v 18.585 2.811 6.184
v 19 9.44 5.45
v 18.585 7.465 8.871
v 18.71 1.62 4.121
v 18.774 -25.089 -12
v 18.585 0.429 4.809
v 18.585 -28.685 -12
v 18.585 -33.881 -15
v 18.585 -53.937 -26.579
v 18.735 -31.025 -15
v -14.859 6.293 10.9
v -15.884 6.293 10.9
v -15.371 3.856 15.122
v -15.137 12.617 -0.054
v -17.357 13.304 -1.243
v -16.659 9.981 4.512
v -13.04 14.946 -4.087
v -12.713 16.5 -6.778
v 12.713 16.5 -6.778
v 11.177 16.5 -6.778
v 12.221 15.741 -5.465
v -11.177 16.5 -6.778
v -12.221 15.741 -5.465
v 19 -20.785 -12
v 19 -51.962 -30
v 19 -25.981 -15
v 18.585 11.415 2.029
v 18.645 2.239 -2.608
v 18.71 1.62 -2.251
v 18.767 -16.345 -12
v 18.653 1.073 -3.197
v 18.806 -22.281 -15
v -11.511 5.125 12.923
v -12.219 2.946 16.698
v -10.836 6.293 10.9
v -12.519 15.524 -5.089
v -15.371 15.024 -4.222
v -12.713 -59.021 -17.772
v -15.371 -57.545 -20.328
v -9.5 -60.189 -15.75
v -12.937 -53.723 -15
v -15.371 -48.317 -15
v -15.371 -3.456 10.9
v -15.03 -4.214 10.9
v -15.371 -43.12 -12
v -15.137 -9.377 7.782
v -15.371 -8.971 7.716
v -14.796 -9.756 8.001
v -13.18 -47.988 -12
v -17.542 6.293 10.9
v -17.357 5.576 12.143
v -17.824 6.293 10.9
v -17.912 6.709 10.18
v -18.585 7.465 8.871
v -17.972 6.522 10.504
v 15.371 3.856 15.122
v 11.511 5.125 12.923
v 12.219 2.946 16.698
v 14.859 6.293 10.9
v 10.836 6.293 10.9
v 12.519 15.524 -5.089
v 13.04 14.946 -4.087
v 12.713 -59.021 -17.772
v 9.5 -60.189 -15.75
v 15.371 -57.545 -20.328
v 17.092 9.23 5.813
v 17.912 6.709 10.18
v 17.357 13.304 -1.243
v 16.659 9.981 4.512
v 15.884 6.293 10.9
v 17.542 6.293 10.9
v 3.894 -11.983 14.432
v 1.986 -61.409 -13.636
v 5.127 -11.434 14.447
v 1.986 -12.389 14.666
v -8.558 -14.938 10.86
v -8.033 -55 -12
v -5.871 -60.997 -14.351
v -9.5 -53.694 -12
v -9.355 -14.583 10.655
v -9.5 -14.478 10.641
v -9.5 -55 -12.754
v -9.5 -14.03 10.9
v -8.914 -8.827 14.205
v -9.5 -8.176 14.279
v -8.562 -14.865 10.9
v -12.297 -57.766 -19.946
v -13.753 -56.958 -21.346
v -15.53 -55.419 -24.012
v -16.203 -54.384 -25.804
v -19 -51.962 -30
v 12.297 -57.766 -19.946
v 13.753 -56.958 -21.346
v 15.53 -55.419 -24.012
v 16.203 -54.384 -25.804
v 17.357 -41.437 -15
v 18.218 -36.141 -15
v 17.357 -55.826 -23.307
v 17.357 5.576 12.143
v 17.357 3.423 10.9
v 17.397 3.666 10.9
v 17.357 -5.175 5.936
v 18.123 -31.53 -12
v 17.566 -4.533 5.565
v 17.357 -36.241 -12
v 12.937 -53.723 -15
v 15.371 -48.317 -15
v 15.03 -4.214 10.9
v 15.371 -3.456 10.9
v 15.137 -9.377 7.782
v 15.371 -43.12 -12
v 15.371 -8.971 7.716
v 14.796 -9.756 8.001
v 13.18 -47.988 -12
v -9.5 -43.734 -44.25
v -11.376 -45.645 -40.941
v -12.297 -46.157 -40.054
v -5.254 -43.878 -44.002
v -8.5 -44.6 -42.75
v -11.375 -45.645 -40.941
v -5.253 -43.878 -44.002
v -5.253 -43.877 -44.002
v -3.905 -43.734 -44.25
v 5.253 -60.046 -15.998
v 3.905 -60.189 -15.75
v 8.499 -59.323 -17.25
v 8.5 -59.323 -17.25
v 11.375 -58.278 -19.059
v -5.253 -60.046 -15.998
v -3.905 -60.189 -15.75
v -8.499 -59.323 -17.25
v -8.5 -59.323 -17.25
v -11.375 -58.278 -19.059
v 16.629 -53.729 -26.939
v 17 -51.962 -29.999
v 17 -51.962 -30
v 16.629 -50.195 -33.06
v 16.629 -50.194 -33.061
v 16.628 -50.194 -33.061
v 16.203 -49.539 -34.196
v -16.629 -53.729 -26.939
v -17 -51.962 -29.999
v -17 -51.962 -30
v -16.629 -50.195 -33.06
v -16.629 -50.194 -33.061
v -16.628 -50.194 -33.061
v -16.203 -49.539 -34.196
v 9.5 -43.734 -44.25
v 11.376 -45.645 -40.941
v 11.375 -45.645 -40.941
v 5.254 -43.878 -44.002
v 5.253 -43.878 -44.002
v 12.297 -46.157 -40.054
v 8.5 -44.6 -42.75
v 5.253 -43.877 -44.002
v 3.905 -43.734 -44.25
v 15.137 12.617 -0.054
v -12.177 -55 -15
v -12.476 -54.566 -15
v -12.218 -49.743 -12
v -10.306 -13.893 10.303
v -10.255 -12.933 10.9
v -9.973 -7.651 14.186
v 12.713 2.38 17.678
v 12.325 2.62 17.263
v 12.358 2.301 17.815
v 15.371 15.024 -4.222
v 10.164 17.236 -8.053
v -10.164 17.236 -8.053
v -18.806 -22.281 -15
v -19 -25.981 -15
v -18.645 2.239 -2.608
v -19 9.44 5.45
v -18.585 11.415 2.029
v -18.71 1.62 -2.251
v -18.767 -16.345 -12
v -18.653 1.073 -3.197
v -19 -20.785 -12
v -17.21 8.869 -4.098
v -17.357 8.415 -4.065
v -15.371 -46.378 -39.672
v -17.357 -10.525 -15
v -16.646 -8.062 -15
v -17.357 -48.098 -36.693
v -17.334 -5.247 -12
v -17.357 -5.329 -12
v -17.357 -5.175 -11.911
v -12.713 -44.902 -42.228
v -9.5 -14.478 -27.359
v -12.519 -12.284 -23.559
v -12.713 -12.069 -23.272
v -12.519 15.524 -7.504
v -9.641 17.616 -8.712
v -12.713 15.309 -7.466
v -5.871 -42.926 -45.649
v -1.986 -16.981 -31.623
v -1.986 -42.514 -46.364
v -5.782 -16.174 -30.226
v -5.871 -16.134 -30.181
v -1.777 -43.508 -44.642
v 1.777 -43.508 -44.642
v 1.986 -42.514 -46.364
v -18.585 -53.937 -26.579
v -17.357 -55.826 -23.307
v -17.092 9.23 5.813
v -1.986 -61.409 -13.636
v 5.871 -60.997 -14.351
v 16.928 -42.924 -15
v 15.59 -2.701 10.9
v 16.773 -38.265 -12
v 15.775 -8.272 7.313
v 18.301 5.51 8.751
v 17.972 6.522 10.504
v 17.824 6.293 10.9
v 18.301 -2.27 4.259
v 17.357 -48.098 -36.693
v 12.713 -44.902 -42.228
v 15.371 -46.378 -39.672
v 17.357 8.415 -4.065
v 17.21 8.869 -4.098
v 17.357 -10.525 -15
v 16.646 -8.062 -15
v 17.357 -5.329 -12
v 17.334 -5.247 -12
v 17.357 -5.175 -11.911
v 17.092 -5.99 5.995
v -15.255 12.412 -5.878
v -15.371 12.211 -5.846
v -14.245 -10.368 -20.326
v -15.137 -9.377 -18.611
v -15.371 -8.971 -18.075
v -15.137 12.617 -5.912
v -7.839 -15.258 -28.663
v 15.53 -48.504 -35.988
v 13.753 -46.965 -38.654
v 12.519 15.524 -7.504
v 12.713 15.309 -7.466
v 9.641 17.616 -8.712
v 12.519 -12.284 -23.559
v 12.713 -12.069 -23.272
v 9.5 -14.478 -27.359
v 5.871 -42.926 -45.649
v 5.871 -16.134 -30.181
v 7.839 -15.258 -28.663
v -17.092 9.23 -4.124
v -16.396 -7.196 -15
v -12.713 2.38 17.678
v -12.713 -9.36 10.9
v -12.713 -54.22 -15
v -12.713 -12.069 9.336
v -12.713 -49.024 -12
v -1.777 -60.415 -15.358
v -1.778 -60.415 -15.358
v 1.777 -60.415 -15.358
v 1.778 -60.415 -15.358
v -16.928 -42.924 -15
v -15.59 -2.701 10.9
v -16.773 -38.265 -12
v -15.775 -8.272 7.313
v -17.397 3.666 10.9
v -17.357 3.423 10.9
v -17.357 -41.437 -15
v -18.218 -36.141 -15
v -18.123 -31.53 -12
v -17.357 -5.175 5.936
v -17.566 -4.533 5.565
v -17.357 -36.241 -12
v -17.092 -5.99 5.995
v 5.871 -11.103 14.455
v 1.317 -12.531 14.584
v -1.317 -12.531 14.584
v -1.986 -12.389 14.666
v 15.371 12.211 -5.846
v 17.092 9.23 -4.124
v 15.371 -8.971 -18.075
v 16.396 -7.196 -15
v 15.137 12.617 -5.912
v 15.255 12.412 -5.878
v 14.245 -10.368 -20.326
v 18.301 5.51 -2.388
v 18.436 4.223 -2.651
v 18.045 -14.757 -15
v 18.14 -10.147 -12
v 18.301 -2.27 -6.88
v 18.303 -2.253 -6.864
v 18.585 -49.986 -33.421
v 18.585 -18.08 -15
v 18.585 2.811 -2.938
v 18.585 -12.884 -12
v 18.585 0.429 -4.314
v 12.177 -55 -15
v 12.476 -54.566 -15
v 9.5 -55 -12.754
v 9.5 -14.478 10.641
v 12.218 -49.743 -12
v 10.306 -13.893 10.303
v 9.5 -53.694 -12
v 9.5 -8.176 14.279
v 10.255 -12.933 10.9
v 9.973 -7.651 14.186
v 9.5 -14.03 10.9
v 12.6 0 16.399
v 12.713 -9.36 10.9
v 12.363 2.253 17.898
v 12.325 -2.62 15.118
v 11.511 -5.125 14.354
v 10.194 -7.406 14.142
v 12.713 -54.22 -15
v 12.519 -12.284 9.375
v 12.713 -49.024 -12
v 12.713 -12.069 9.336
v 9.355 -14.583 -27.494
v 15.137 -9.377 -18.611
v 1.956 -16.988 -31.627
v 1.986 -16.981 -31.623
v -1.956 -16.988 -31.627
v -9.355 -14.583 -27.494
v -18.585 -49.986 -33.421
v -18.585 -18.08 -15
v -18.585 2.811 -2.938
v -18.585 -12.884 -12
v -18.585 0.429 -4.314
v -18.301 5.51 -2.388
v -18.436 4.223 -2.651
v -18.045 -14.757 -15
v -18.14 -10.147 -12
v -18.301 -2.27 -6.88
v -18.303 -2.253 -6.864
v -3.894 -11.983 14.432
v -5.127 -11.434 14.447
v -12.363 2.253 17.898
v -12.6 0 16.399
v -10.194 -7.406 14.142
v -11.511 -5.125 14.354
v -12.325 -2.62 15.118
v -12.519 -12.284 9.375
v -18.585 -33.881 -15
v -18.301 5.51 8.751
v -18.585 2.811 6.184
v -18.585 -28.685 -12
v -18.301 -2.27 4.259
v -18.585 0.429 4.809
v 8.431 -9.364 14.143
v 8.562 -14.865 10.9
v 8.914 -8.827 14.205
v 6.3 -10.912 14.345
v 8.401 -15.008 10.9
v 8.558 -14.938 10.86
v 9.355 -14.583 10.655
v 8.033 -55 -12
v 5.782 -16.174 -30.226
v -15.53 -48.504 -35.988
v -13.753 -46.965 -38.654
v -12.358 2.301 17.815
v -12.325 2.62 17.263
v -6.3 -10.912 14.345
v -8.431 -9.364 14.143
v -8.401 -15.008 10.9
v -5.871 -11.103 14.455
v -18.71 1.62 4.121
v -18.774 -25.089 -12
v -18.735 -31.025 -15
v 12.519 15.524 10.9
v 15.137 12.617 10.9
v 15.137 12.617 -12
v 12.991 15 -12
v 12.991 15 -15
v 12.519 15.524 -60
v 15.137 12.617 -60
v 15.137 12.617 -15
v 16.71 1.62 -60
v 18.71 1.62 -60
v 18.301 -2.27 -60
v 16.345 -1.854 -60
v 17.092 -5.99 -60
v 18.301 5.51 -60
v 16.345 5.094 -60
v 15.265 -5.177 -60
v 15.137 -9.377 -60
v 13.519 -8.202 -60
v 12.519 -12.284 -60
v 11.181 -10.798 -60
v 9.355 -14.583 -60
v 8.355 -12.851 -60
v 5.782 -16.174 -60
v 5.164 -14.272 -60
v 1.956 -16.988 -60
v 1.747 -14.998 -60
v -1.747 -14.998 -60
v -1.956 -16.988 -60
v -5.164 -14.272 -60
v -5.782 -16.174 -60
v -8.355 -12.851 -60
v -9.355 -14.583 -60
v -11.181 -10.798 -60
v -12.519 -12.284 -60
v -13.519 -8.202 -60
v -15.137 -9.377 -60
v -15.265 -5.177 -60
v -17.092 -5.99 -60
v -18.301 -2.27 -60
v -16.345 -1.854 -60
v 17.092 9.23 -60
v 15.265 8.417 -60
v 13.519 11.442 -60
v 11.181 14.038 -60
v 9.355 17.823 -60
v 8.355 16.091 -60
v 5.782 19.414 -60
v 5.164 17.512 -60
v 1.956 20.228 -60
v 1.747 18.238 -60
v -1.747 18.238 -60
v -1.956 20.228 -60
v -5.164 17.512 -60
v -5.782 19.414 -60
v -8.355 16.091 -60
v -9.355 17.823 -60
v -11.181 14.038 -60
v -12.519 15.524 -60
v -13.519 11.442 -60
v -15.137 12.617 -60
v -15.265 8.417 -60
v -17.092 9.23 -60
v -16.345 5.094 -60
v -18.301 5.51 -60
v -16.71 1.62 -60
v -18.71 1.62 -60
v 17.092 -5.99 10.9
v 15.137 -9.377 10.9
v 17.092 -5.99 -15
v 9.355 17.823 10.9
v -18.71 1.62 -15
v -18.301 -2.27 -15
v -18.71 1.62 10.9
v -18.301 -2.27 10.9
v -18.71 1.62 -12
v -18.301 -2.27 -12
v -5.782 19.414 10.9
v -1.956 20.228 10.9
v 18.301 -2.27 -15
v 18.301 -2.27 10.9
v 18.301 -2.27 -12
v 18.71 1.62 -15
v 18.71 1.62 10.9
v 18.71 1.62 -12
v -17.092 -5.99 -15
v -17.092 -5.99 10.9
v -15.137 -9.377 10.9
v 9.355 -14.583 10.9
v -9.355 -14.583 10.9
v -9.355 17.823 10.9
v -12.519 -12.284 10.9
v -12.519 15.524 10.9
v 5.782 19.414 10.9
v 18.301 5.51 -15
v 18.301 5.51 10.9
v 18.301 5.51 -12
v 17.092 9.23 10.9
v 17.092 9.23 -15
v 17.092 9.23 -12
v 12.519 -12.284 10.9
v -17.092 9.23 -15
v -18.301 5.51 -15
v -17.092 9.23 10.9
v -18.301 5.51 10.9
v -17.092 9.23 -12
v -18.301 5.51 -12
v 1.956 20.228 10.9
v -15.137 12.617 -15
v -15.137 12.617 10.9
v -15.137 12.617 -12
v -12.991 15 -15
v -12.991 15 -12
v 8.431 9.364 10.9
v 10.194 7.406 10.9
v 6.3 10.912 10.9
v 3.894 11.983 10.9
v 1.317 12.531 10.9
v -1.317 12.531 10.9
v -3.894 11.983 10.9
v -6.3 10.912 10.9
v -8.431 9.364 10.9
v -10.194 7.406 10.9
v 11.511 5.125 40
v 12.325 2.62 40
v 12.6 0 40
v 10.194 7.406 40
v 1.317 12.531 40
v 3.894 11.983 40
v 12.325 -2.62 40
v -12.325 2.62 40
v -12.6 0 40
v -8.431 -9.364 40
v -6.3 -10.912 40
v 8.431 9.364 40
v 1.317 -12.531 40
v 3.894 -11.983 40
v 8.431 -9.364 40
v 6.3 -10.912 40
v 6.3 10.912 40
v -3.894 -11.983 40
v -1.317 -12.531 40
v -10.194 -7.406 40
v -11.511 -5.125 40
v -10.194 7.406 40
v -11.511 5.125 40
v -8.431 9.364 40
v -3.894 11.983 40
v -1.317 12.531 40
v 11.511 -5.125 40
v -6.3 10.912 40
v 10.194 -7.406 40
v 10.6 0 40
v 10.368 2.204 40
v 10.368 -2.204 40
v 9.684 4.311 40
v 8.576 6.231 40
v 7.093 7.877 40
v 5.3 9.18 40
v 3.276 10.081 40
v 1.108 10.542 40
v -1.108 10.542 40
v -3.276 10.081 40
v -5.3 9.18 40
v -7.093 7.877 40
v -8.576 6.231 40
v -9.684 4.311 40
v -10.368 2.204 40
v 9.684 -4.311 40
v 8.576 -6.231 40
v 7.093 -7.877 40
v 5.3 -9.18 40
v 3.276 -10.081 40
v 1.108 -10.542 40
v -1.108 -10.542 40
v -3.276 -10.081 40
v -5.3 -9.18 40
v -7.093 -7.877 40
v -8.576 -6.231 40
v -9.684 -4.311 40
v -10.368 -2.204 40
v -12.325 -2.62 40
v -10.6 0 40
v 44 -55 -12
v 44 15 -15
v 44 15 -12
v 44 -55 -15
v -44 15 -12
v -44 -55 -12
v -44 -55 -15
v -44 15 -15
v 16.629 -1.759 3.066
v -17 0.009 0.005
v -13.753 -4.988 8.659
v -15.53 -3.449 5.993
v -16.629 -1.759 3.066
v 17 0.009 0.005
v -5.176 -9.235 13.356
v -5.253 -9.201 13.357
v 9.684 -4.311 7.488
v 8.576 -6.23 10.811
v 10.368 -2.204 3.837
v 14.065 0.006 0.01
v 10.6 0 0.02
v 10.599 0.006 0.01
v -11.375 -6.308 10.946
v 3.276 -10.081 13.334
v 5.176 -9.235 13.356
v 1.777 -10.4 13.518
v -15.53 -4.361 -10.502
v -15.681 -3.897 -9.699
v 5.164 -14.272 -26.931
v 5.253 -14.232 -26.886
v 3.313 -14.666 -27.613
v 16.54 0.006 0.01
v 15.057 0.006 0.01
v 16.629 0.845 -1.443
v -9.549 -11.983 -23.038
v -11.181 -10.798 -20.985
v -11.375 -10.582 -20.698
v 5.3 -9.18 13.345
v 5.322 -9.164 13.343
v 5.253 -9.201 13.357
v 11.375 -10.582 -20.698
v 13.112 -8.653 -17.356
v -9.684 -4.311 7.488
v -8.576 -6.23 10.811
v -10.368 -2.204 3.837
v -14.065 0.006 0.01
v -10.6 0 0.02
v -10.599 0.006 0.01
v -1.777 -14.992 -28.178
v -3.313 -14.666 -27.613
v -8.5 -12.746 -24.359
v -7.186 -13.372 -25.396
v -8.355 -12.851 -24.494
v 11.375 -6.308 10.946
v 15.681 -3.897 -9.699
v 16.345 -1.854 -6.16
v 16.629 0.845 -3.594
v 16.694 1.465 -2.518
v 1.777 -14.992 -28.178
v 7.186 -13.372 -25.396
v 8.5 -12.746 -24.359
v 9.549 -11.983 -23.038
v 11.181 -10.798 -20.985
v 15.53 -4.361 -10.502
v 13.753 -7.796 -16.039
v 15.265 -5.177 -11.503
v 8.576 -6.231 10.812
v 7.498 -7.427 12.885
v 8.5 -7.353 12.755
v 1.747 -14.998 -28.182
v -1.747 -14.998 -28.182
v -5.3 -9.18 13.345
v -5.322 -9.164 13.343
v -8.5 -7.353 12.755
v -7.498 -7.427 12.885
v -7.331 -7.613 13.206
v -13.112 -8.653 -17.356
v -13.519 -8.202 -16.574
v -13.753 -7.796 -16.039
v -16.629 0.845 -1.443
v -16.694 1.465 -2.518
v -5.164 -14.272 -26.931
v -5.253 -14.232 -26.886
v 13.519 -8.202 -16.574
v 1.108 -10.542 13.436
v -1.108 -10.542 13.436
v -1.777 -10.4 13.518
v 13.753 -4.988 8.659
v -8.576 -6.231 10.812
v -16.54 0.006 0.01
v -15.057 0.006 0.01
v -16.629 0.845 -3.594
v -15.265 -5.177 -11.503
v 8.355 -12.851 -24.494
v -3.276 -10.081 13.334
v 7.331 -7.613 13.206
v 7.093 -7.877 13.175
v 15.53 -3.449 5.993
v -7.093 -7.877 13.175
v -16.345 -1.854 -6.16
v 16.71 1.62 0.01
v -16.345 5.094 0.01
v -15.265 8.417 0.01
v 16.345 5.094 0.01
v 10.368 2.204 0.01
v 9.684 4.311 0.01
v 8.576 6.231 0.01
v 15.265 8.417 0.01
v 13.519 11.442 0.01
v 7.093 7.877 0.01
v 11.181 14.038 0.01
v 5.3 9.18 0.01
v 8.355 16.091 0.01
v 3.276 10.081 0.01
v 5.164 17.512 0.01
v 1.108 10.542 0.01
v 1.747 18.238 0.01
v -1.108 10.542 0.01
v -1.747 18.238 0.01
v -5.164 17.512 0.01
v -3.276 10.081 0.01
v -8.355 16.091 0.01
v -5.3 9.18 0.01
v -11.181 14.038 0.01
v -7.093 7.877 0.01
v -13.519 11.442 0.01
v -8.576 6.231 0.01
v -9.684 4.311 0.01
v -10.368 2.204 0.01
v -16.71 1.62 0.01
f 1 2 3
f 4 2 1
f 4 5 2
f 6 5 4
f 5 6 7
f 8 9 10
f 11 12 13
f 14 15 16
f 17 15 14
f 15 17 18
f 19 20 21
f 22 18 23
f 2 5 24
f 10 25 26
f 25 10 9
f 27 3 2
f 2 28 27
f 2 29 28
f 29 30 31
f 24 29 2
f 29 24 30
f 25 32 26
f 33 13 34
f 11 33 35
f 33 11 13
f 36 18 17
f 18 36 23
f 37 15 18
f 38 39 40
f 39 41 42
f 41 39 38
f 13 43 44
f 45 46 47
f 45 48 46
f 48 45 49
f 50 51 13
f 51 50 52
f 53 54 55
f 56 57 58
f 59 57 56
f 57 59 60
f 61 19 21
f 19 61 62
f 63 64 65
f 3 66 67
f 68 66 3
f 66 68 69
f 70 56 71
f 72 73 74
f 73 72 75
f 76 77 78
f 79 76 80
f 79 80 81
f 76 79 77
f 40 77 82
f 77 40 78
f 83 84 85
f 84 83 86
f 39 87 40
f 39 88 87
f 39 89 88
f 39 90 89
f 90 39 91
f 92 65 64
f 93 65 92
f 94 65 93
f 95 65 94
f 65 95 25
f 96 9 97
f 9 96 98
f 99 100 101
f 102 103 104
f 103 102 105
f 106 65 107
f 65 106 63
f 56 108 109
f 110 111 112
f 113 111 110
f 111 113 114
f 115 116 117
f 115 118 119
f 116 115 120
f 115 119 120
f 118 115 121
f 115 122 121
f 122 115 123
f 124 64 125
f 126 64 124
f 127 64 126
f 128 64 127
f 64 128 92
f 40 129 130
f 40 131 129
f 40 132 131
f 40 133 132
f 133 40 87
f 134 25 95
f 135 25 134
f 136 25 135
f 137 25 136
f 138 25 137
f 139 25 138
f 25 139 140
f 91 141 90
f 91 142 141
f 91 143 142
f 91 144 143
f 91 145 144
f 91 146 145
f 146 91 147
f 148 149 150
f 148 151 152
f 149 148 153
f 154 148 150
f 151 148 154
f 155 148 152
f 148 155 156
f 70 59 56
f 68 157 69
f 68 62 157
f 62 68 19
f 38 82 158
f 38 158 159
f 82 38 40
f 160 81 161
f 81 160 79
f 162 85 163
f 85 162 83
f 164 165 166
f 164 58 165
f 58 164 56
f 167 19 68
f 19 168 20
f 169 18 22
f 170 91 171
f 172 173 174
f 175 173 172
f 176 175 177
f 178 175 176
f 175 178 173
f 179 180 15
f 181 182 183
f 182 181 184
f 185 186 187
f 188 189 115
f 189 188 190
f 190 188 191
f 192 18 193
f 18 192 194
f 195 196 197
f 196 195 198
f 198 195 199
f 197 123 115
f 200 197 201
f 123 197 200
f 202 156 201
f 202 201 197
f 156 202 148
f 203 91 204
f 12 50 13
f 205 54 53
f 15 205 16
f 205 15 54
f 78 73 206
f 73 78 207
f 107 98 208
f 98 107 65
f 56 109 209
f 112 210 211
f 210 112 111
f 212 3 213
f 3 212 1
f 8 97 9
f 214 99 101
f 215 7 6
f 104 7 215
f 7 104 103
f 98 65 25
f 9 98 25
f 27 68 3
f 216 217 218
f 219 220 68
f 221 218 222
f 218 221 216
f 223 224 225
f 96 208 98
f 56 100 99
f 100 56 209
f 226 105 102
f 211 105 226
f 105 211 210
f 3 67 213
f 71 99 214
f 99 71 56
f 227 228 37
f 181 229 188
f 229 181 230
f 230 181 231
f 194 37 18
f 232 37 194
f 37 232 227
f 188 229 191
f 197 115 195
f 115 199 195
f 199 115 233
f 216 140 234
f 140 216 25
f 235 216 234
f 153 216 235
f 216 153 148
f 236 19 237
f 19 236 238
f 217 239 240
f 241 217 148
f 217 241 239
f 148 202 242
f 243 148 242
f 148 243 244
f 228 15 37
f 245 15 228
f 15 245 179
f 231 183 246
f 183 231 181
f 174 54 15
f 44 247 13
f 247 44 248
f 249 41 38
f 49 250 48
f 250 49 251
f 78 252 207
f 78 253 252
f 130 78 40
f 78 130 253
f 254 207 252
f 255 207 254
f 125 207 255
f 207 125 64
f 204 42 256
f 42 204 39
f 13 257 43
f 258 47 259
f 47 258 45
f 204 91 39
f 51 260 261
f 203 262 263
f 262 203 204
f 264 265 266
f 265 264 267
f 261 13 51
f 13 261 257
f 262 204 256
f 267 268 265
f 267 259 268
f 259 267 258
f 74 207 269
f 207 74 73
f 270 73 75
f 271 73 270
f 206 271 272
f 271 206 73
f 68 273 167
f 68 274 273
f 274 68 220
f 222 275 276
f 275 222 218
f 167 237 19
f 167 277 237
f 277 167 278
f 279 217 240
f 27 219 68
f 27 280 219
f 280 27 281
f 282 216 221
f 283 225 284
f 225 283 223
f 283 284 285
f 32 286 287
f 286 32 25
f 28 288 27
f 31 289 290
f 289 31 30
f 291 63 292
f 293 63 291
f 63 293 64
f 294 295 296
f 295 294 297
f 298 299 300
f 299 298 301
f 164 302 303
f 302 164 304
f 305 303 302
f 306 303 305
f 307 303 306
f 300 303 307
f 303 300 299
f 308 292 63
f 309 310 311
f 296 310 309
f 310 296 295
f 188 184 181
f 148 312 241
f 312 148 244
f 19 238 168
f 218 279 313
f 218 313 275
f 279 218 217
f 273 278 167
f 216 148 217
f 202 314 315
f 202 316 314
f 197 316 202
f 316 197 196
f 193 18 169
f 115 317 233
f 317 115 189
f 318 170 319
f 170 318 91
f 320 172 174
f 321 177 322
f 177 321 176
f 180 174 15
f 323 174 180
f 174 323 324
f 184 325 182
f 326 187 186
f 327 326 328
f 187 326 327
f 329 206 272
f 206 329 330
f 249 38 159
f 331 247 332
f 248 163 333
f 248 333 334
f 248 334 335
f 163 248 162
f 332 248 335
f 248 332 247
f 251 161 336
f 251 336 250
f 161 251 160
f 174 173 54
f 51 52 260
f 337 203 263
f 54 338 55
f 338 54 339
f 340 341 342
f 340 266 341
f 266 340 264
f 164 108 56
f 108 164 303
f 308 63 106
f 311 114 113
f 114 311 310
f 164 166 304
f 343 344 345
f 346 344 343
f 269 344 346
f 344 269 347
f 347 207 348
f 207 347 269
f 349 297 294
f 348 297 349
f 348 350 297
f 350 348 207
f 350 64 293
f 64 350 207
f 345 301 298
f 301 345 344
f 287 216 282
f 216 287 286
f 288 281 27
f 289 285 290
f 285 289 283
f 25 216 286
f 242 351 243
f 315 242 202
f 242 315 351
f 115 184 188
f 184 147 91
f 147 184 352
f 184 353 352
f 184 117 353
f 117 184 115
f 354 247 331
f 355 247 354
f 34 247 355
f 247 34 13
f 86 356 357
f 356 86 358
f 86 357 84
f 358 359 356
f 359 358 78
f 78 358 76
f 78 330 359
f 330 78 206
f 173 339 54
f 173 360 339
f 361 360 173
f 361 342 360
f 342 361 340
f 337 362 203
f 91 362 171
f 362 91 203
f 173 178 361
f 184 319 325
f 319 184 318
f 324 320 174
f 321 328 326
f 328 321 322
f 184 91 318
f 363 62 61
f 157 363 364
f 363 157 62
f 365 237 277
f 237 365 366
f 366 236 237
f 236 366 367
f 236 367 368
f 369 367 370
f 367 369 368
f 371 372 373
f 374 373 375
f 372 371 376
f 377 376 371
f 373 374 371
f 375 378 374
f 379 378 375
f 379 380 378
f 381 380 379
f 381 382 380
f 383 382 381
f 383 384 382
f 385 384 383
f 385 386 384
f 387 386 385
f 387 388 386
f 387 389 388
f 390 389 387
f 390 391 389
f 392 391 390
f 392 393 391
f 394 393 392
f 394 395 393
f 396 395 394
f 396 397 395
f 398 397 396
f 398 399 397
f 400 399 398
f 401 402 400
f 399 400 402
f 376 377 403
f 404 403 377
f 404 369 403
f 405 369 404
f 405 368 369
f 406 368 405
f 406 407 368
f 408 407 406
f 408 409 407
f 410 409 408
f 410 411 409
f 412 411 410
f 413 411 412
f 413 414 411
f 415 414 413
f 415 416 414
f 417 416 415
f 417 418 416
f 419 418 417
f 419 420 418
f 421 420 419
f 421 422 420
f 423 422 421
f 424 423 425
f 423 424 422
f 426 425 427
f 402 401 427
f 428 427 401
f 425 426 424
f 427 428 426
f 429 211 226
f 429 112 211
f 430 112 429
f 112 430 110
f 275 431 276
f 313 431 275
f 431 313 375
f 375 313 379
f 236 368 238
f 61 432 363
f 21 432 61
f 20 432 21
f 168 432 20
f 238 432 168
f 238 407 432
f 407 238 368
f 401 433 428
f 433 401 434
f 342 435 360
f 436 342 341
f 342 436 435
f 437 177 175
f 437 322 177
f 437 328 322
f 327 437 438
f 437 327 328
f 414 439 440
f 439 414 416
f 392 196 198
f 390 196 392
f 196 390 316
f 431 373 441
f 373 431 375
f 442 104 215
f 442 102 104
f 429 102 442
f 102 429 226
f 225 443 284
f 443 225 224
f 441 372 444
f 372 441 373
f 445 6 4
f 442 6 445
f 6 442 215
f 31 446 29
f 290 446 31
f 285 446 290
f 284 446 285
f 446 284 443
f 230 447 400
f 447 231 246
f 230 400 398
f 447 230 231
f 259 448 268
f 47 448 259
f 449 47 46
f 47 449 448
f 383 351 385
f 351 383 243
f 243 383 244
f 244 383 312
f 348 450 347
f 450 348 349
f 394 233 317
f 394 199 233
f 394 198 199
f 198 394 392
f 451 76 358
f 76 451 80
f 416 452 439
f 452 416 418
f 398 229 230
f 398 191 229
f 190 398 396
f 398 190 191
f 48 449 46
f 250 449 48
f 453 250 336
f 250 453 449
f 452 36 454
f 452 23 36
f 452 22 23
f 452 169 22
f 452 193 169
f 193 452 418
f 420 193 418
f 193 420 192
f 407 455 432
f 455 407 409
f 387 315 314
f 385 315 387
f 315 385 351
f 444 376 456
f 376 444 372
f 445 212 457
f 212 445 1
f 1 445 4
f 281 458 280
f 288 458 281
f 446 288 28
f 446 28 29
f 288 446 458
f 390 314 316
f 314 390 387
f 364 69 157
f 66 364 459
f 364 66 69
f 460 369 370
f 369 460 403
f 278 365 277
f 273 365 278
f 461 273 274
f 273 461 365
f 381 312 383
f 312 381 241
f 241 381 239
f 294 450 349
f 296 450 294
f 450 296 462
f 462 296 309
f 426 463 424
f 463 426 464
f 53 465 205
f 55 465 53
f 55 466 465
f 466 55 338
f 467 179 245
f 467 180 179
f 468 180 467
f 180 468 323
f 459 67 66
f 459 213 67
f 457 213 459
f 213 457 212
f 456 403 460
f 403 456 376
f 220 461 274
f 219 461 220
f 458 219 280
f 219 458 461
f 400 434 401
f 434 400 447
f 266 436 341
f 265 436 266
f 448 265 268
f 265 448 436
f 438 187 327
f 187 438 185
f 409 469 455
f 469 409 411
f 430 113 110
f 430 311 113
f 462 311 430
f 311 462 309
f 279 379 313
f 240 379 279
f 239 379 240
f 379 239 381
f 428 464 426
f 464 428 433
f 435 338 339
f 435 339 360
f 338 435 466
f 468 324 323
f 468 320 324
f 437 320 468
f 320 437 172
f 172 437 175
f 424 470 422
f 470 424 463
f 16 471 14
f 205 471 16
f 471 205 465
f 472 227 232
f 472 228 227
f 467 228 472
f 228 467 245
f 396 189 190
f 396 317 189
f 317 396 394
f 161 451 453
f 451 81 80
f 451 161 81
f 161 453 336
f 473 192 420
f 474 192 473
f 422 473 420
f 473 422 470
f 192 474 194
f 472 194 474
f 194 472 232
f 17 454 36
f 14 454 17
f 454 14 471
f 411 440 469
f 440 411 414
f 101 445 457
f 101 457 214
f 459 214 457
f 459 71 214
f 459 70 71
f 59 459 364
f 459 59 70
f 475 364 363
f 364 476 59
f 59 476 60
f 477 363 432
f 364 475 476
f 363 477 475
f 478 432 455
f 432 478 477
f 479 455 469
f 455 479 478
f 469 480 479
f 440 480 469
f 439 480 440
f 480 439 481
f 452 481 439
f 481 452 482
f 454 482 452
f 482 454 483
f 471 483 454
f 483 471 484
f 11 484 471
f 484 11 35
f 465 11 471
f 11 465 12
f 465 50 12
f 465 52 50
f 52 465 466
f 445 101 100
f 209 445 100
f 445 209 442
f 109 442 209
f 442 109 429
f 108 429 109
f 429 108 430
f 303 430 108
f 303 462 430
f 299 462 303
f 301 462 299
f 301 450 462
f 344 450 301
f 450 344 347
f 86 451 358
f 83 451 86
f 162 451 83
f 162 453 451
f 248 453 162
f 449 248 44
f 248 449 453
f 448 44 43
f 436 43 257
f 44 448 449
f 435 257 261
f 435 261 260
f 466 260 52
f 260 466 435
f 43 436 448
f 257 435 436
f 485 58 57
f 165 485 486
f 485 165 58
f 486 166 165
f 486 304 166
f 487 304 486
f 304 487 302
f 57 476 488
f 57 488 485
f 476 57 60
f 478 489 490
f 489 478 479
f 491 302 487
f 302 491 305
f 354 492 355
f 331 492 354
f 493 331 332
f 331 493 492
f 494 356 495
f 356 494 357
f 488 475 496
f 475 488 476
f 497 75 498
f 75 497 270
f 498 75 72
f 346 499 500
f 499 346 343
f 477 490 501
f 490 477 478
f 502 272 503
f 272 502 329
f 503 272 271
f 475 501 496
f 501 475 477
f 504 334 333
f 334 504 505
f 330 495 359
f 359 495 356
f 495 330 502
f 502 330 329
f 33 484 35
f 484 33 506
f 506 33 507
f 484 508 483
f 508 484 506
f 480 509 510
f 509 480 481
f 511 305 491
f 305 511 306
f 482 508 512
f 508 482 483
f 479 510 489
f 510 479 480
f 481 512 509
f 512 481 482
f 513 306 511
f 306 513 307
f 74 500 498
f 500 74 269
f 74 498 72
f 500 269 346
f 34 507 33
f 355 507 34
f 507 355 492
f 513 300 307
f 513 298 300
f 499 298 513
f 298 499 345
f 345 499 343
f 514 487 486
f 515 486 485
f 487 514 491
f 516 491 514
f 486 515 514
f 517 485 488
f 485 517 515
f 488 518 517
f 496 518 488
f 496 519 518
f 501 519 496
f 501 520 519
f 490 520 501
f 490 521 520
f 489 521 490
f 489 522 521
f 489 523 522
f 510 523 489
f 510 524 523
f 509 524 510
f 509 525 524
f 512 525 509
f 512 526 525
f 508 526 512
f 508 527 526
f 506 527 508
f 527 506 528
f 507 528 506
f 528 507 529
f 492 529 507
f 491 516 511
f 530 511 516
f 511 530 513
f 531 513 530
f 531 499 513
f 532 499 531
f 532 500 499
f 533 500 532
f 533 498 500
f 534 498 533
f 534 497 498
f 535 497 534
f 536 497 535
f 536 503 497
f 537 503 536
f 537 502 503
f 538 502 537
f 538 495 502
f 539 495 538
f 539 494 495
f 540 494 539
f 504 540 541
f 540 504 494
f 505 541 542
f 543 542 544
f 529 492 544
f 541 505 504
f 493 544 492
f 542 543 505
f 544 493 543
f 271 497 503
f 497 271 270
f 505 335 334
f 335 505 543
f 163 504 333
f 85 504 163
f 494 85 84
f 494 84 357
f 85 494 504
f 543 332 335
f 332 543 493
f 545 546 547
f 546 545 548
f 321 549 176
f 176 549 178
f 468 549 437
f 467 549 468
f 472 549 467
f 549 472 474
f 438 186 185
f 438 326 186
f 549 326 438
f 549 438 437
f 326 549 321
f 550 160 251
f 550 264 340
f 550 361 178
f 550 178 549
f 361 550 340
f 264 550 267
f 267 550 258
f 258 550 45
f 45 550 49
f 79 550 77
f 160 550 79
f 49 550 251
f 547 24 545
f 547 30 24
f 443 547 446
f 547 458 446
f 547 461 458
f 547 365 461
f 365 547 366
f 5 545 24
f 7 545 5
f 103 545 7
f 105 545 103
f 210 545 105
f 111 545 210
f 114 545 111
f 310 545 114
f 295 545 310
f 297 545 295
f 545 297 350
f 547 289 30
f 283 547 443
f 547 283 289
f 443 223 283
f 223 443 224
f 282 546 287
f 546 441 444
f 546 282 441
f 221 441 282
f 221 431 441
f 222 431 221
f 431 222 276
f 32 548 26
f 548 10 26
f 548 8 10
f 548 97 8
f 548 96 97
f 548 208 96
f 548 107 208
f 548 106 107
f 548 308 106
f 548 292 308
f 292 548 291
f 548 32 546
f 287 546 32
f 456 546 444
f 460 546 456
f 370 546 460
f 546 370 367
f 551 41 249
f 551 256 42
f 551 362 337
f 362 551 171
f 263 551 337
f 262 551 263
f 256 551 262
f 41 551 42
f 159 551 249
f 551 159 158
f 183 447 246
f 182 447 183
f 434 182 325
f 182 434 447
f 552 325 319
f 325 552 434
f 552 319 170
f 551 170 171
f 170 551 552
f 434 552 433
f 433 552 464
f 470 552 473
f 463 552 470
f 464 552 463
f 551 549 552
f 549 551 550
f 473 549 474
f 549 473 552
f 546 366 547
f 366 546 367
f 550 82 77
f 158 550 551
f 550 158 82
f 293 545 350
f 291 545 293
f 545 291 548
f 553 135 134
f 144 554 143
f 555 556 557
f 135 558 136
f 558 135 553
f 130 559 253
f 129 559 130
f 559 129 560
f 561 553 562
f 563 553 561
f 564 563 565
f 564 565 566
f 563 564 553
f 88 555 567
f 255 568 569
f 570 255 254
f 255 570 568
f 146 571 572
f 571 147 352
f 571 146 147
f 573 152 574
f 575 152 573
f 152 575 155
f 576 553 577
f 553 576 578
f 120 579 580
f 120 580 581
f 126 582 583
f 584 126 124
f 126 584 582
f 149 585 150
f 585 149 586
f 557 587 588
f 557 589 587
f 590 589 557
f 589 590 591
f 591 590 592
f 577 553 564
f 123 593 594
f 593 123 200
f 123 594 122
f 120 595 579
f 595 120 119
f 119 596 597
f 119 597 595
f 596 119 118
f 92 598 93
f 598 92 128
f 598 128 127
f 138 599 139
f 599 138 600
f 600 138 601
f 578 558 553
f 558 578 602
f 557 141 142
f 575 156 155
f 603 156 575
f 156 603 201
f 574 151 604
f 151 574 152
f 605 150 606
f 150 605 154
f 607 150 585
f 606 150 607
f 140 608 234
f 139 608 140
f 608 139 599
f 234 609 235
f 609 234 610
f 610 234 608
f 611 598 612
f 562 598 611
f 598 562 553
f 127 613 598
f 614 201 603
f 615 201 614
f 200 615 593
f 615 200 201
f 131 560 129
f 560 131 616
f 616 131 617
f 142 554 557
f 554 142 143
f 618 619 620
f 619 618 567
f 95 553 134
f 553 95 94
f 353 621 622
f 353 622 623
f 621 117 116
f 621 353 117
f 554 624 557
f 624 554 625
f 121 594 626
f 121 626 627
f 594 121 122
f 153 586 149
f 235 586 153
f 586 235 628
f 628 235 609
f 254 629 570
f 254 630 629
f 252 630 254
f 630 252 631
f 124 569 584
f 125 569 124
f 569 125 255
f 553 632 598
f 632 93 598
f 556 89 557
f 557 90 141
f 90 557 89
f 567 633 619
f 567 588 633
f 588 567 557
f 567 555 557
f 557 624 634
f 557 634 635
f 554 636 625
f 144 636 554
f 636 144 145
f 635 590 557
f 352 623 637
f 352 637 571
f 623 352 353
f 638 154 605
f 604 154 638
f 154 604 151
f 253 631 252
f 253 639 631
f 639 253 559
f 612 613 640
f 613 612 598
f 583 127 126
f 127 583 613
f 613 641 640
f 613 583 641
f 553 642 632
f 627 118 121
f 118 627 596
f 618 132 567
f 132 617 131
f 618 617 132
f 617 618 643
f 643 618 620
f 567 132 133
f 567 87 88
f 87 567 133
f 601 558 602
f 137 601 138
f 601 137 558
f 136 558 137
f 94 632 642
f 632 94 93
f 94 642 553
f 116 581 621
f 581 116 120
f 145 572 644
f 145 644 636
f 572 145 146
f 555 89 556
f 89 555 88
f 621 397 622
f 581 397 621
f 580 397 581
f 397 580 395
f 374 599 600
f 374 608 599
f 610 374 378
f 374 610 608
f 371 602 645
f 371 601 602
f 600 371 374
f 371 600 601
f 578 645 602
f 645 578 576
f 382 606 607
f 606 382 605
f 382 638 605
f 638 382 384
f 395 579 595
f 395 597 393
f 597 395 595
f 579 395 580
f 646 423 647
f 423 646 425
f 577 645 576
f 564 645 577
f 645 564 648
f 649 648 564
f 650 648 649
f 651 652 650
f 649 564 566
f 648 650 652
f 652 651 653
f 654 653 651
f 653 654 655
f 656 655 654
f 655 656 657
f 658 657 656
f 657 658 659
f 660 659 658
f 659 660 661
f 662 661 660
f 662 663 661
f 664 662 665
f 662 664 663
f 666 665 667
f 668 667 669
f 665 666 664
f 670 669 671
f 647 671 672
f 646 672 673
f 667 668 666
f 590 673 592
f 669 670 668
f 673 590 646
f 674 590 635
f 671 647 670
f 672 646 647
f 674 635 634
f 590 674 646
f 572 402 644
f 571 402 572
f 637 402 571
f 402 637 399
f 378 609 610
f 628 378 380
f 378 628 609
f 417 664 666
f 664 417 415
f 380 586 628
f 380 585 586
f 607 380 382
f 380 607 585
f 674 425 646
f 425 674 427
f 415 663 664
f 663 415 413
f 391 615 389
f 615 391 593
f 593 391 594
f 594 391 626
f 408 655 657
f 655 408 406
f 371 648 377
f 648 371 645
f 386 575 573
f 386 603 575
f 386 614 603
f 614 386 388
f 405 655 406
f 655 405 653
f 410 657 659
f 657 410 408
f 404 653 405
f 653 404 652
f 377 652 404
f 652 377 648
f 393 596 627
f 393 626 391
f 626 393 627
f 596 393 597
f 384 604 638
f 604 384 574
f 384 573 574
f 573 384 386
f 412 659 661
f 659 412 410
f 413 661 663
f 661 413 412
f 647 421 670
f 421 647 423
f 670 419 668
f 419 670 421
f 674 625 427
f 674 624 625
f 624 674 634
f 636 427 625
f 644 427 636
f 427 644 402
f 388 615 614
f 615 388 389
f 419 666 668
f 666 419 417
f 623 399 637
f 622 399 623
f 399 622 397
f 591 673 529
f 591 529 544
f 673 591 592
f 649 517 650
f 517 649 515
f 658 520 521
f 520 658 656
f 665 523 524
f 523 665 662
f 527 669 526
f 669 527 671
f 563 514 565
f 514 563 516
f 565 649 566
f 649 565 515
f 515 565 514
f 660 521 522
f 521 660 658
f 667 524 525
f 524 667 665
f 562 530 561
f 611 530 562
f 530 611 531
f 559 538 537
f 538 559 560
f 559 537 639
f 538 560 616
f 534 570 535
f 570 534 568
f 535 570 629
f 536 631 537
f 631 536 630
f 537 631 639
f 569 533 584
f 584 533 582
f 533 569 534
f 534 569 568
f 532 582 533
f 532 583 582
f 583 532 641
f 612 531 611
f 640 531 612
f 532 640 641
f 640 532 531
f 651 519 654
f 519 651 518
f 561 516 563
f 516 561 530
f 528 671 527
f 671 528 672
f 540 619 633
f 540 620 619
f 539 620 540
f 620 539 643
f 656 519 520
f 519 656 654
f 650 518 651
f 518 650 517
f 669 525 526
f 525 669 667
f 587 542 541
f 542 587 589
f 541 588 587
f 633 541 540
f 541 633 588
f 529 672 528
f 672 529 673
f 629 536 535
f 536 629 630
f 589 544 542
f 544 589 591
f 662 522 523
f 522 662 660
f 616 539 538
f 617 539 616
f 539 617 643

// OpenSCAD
/*

Time Log

July 20:
    - 1937-2327 -- install OpenSCAD, first pass
July 21:
    - 1009-1020 -- update B-2 ID

TODO:
    - ask for payment (at $50/hr)
    - add serial number to parts

August 22:
    - If doing again, use a union for the top parts to avoid the "wings" from
      crossing cylinders.
    - time spent: 2h50 + 0h12 = 3h02
    - 3.25 * $50 = $162.50 --> asked for $165
*/

z_adj = 0.01;

A_1_ID = 34;  // inside diameter, in mm 
A_2_ID = 34;
A_3_ID = 21.2;
A_1_length = 60;  // branch length, in mm
A_2_length = 60;
A_3_length = 40;
A_thickness = 2;  // shell thickness, in mm
A_1_rotation = 120;  // rotation of part A, in degrees
A_2_rotation = -120;  // rotation of part A, in degrees
A_3_rotation = 0;  // rotation of part A, in degrees
A_1_extra_legnth = 10.9;  // extension to allow upstream meeting
A_2_extra_legnth = 10.9;  // extension to allow upstream meeting
A_bottom_plate_height = 10;
A_wing_width = 25;  // wing width on each side
A_wing_length = 100;
A_wing_delta_z = -15;  // reposition of wing
A_wing_thickness = 3;

B_1_ID = 34;  // inside diameter, in mm 
B_2_ID = 33.42;
B_3_ID = 21.2;
B_1_length = 60;  // branch length, in mm
B_2_length = 60;
B_3_length = 40;
B_thickness = 2;  // shell thickness, in mm
B_1_rotation = 120;  // rotation of part A, in degrees
B_2_rotation = -180;  // rotation of part A, in degrees
B_3_rotation = 0;  // rotation of part A, in degrees
B_1_extra_legnth = 10.9;  // extension to allow upstream meeting
B_2_extra_legnth = 10.9;  // extension to allow upstream meeting
B_2_offset = -B_2_ID + B_3_ID * 3/2;
B_bottom_plate_height = 10;
B_wing_width = 25;  // wing width on each side
B_wing_length = 70;
B_wing_delta_y = 20;
B_wing_delta_z = -15;  // reposition of wing
B_wing_thickness = 3;


C_1_ID = 34;  // inside diameter, in mm 
C_2_ID = 21.2;
C_1_length = 60;  // branch length, in mm
C_2_length = 40;
C_thickness = 2;  // shell thickness, in mm
C_1_rotation = 90;  // rotation of part A, in degrees
C_2_rotation = 0;  // rotation of part A, in degrees
C_1_extra_legnth = C_2_ID / 2 + C_thickness;  // extension to allow upstream meeting
C_2_extra_legnth = 0;  // extension to allow upstream meeting
C_2_offset = 0;
C_bottom_plate_height = 10;
C_wing_width = 25;  // wing width on each side
C_wing_length = 72.6;
C_wing_delta_y = 23.7;
C_wing_delta_z = 0;  // reposition of wing
C_wing_thickness = 3;
C_ramp_length_adjustment = 20;
C_ramp_length_angle = 137;

module part_a() {
    difference() {
        union() {
            rotate([A_1_rotation, 0, 0])
                translate([0, 0, -A_1_extra_legnth])
                cylinder(d = A_1_ID + A_thickness * 2, h = A_1_length + A_1_extra_legnth);

            rotate([A_2_rotation, 0, 0])
                translate([0, 0, -A_2_extra_legnth])
                cylinder(d = A_2_ID + A_thickness * 2, h = A_2_length + A_2_extra_legnth);

            rotate([A_3_rotation, 0, 0])
                cylinder(d = A_3_ID + A_thickness * 2, h = A_3_length);

            // wing
            translate([-A_1_ID / 2 - A_thickness - A_wing_width, -A_wing_length/2, A_wing_delta_z]) 
            cube([A_1_ID + A_thickness * 2 + A_wing_width * 2, A_wing_length, A_wing_thickness]);
        }

        rotate([A_1_rotation, 0, 0])
            translate([0, 0, -z_adj])
            cylinder(d = A_1_ID, h = A_1_length + z_adj * 2);

        rotate([A_2_rotation, 0, 0])
            translate([0, 0, -z_adj])
            cylinder(d = A_2_ID, h = A_2_length + z_adj * 2);

        rotate([A_3_rotation, 0, 0])
            translate([0, 0, -z_adj])
            cylinder(d = A_3_ID, h = A_3_length + z_adj * 2);
    }

    // internal divider plate
    translate(v = [0, 0, -5]) 
    difference() {
        rotate([90, 0, 0])
        cylinder(d = A_1_ID, h = A_thickness);

        translate([
            -A_1_ID / 2 - z_adj,
            -A_thickness - z_adj,
            0
        ]) 
        cube([A_1_ID + z_adj * 2, A_thickness + z_adj * 2, A_1_ID]);
    }
}

module part_b() {
    difference() {
        union() {
            rotate([B_1_rotation, 0, 0])
                translate([0, 0, -B_1_extra_legnth])
                cylinder(d = B_1_ID + B_thickness * 2, h = B_1_length + B_1_extra_legnth);

            rotate([B_2_rotation, 0, 0])
                translate([0, B_2_offset, -B_2_extra_legnth])
                cylinder(d = B_2_ID + B_thickness * 2, h = B_2_length + B_2_extra_legnth);

            rotate([B_3_rotation, 0, 0])
                cylinder(d = B_3_ID + B_thickness * 2, h = B_3_length);

            // wing
            translate([
                -B_1_ID / 2 - B_thickness - B_wing_width,
                -B_wing_length/2 - B_wing_delta_y,
                B_wing_delta_z
            ]) 
            cube([B_1_ID + B_thickness * 2 + B_wing_width * 2, B_wing_length, B_wing_thickness]);
        }

        rotate([B_1_rotation, 0, 0])
            translate([0, 0, -z_adj])
            cylinder(d = B_1_ID, h = B_1_length + z_adj * 2);

        rotate([B_2_rotation, 0, 0])
            translate([0, B_2_offset, -z_adj])
            cylinder(d = B_2_ID, h = B_2_length + z_adj * 2);

        rotate([B_3_rotation, 0, 0])
            translate([0, 0, -z_adj])
            cylinder(d = B_3_ID, h = B_3_length + z_adj * 2);
    }
}


module part_c() {
    difference() {
        union() {
            rotate([C_1_rotation, 0, 0])
                translate([0, 0, -C_1_extra_legnth])
                cylinder(d = C_1_ID + C_thickness * 2, h = C_1_length + C_1_extra_legnth);

            rotate([C_2_rotation, 0, 0])
                translate([0, 0, -C_2_extra_legnth])
                cylinder(d = C_2_ID + C_thickness * 2, h = C_2_length + C_2_extra_legnth);

            // wing
            translate([
                -C_1_ID / 2 - C_thickness - C_wing_width,
                -C_wing_length/2 - C_wing_delta_y,
                C_wing_delta_z
            ]) 
            cube([C_1_ID + C_thickness * 2 + C_wing_width * 2, C_wing_length, C_wing_thickness]);
        }

        rotate([C_1_rotation, 0, 0])
            translate([0, 0, -z_adj])
            cylinder(d = C_1_ID, h = C_1_length + z_adj * 2);

        rotate([C_2_rotation, 0, 0])
            translate([0, C_2_offset, -z_adj])
            cylinder(d = C_2_ID, h = C_2_length + z_adj * 2);

        // ramp between the two sections
        intersection() {
            rotate([C_1_rotation, 0, 0])
                translate([0, 0, -C_2_ID / 2])
                cylinder(d = C_1_ID, h = C_2_ID / 2);

            rotate([C_2_rotation, 0, 0])
                translate([0, C_2_offset, -z_adj*0 - C_1_ID / 2 * 1])
                cylinder(d = C_2_ID, h = C_1_ID / 2);

            rotate([C_ramp_length_angle, 0, 0])
                translate([0, -1, -C_ramp_length_adjustment / 2])
                cylinder(d = C_2_ID, h = C_1_ID / 2 + C_ramp_length_adjustment);
        }

        // // cut in half (to see insides)
        // translate([-50, -100, -50]) 
        // cube([50, 150, 100]);
    }
}

part_b();
